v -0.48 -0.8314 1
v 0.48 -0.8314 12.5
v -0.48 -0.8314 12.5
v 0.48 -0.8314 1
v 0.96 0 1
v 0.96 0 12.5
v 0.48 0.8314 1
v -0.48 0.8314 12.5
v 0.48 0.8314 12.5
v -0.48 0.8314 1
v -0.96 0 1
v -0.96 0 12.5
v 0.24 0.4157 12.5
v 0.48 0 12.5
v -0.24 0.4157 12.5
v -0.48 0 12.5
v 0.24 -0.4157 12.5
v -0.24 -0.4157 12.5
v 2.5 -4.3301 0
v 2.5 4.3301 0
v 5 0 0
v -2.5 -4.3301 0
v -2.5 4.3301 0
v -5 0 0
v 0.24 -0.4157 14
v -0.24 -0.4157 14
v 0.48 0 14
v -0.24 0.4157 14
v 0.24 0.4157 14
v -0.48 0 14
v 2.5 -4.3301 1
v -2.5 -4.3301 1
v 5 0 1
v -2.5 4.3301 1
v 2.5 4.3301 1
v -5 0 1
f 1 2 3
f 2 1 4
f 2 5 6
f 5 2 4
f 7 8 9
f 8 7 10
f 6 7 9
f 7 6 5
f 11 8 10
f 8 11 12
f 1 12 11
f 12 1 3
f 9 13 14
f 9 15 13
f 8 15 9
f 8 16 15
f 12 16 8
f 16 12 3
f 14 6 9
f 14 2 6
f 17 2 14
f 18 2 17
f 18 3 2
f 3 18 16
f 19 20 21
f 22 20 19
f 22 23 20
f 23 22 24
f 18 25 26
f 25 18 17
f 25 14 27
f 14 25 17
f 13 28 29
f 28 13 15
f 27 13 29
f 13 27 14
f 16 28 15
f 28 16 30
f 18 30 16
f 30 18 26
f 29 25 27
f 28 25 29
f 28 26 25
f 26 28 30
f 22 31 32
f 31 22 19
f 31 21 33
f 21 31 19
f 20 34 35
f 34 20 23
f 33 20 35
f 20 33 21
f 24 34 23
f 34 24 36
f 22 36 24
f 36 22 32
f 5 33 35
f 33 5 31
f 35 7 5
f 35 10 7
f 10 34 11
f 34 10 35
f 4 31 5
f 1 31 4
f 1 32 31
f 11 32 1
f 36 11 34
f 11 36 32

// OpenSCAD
// file: cookie_cutter.scad
// Cookie cutter generator
// Pau Fernández <pauek@minidosis.org>
// GNU GPL v2

module dxf(file, layer, height) {
   orig = dxf_cross(file = file, layer = layer);
   echo("origin: ", orig);
   translate([-orig[0], -orig[1], 0])
      linear_extrude(height = height)
         import(file = file, layer = layer);
}

module needle(height, thin1, thin2) {
   union() {
      cylinder(r = thin1, h = height-1.5, $fn = 6);
      cylinder(r = thin2, h = height, $fn = 6);
   }
}

module wall(file, layer, height, thin) {
   difference() {
      minkowski() {
        dxf(file, layer, 0.01);
        cylinder(r = thin, h = height, $fn = 6);
      }
      translate([0, 0, -1]) dxf(file, layer, height + 2);
   }
}

module cutter(file, layer, height, nozzle_diameter) {
   thin1 = nozzle_diameter * 2.4;
   thin2 = nozzle_diameter * 1.2;
   difference() {
      minkowski() {
        dxf(file, layer, 0.01);
        needle(height, thin1, thin2);
      }
      translate([0, 0, -1]) dxf(file, layer, height + 2);
   }
}

module cookie_cutter(file, height, join_height, nozzle_diameter) {
   union () {
      cutter(file, "cutter", height, nozzle_diameter);
      wall(file, "outer", 1, 5);
   }
}

module cookie_cutter_join(file, height, join_height, nozzle_diameter) {
   union () {
      cutter(file, "cutter", height, nozzle_diameter);
      wall(file, "outer", 1, 5);
      dxf(file, "join", join_height);
   }
}
// main file
include <cookie_cutter.scad>;
cookie_cutter("rocket.dxf", 14, 3.5, 0.4);
